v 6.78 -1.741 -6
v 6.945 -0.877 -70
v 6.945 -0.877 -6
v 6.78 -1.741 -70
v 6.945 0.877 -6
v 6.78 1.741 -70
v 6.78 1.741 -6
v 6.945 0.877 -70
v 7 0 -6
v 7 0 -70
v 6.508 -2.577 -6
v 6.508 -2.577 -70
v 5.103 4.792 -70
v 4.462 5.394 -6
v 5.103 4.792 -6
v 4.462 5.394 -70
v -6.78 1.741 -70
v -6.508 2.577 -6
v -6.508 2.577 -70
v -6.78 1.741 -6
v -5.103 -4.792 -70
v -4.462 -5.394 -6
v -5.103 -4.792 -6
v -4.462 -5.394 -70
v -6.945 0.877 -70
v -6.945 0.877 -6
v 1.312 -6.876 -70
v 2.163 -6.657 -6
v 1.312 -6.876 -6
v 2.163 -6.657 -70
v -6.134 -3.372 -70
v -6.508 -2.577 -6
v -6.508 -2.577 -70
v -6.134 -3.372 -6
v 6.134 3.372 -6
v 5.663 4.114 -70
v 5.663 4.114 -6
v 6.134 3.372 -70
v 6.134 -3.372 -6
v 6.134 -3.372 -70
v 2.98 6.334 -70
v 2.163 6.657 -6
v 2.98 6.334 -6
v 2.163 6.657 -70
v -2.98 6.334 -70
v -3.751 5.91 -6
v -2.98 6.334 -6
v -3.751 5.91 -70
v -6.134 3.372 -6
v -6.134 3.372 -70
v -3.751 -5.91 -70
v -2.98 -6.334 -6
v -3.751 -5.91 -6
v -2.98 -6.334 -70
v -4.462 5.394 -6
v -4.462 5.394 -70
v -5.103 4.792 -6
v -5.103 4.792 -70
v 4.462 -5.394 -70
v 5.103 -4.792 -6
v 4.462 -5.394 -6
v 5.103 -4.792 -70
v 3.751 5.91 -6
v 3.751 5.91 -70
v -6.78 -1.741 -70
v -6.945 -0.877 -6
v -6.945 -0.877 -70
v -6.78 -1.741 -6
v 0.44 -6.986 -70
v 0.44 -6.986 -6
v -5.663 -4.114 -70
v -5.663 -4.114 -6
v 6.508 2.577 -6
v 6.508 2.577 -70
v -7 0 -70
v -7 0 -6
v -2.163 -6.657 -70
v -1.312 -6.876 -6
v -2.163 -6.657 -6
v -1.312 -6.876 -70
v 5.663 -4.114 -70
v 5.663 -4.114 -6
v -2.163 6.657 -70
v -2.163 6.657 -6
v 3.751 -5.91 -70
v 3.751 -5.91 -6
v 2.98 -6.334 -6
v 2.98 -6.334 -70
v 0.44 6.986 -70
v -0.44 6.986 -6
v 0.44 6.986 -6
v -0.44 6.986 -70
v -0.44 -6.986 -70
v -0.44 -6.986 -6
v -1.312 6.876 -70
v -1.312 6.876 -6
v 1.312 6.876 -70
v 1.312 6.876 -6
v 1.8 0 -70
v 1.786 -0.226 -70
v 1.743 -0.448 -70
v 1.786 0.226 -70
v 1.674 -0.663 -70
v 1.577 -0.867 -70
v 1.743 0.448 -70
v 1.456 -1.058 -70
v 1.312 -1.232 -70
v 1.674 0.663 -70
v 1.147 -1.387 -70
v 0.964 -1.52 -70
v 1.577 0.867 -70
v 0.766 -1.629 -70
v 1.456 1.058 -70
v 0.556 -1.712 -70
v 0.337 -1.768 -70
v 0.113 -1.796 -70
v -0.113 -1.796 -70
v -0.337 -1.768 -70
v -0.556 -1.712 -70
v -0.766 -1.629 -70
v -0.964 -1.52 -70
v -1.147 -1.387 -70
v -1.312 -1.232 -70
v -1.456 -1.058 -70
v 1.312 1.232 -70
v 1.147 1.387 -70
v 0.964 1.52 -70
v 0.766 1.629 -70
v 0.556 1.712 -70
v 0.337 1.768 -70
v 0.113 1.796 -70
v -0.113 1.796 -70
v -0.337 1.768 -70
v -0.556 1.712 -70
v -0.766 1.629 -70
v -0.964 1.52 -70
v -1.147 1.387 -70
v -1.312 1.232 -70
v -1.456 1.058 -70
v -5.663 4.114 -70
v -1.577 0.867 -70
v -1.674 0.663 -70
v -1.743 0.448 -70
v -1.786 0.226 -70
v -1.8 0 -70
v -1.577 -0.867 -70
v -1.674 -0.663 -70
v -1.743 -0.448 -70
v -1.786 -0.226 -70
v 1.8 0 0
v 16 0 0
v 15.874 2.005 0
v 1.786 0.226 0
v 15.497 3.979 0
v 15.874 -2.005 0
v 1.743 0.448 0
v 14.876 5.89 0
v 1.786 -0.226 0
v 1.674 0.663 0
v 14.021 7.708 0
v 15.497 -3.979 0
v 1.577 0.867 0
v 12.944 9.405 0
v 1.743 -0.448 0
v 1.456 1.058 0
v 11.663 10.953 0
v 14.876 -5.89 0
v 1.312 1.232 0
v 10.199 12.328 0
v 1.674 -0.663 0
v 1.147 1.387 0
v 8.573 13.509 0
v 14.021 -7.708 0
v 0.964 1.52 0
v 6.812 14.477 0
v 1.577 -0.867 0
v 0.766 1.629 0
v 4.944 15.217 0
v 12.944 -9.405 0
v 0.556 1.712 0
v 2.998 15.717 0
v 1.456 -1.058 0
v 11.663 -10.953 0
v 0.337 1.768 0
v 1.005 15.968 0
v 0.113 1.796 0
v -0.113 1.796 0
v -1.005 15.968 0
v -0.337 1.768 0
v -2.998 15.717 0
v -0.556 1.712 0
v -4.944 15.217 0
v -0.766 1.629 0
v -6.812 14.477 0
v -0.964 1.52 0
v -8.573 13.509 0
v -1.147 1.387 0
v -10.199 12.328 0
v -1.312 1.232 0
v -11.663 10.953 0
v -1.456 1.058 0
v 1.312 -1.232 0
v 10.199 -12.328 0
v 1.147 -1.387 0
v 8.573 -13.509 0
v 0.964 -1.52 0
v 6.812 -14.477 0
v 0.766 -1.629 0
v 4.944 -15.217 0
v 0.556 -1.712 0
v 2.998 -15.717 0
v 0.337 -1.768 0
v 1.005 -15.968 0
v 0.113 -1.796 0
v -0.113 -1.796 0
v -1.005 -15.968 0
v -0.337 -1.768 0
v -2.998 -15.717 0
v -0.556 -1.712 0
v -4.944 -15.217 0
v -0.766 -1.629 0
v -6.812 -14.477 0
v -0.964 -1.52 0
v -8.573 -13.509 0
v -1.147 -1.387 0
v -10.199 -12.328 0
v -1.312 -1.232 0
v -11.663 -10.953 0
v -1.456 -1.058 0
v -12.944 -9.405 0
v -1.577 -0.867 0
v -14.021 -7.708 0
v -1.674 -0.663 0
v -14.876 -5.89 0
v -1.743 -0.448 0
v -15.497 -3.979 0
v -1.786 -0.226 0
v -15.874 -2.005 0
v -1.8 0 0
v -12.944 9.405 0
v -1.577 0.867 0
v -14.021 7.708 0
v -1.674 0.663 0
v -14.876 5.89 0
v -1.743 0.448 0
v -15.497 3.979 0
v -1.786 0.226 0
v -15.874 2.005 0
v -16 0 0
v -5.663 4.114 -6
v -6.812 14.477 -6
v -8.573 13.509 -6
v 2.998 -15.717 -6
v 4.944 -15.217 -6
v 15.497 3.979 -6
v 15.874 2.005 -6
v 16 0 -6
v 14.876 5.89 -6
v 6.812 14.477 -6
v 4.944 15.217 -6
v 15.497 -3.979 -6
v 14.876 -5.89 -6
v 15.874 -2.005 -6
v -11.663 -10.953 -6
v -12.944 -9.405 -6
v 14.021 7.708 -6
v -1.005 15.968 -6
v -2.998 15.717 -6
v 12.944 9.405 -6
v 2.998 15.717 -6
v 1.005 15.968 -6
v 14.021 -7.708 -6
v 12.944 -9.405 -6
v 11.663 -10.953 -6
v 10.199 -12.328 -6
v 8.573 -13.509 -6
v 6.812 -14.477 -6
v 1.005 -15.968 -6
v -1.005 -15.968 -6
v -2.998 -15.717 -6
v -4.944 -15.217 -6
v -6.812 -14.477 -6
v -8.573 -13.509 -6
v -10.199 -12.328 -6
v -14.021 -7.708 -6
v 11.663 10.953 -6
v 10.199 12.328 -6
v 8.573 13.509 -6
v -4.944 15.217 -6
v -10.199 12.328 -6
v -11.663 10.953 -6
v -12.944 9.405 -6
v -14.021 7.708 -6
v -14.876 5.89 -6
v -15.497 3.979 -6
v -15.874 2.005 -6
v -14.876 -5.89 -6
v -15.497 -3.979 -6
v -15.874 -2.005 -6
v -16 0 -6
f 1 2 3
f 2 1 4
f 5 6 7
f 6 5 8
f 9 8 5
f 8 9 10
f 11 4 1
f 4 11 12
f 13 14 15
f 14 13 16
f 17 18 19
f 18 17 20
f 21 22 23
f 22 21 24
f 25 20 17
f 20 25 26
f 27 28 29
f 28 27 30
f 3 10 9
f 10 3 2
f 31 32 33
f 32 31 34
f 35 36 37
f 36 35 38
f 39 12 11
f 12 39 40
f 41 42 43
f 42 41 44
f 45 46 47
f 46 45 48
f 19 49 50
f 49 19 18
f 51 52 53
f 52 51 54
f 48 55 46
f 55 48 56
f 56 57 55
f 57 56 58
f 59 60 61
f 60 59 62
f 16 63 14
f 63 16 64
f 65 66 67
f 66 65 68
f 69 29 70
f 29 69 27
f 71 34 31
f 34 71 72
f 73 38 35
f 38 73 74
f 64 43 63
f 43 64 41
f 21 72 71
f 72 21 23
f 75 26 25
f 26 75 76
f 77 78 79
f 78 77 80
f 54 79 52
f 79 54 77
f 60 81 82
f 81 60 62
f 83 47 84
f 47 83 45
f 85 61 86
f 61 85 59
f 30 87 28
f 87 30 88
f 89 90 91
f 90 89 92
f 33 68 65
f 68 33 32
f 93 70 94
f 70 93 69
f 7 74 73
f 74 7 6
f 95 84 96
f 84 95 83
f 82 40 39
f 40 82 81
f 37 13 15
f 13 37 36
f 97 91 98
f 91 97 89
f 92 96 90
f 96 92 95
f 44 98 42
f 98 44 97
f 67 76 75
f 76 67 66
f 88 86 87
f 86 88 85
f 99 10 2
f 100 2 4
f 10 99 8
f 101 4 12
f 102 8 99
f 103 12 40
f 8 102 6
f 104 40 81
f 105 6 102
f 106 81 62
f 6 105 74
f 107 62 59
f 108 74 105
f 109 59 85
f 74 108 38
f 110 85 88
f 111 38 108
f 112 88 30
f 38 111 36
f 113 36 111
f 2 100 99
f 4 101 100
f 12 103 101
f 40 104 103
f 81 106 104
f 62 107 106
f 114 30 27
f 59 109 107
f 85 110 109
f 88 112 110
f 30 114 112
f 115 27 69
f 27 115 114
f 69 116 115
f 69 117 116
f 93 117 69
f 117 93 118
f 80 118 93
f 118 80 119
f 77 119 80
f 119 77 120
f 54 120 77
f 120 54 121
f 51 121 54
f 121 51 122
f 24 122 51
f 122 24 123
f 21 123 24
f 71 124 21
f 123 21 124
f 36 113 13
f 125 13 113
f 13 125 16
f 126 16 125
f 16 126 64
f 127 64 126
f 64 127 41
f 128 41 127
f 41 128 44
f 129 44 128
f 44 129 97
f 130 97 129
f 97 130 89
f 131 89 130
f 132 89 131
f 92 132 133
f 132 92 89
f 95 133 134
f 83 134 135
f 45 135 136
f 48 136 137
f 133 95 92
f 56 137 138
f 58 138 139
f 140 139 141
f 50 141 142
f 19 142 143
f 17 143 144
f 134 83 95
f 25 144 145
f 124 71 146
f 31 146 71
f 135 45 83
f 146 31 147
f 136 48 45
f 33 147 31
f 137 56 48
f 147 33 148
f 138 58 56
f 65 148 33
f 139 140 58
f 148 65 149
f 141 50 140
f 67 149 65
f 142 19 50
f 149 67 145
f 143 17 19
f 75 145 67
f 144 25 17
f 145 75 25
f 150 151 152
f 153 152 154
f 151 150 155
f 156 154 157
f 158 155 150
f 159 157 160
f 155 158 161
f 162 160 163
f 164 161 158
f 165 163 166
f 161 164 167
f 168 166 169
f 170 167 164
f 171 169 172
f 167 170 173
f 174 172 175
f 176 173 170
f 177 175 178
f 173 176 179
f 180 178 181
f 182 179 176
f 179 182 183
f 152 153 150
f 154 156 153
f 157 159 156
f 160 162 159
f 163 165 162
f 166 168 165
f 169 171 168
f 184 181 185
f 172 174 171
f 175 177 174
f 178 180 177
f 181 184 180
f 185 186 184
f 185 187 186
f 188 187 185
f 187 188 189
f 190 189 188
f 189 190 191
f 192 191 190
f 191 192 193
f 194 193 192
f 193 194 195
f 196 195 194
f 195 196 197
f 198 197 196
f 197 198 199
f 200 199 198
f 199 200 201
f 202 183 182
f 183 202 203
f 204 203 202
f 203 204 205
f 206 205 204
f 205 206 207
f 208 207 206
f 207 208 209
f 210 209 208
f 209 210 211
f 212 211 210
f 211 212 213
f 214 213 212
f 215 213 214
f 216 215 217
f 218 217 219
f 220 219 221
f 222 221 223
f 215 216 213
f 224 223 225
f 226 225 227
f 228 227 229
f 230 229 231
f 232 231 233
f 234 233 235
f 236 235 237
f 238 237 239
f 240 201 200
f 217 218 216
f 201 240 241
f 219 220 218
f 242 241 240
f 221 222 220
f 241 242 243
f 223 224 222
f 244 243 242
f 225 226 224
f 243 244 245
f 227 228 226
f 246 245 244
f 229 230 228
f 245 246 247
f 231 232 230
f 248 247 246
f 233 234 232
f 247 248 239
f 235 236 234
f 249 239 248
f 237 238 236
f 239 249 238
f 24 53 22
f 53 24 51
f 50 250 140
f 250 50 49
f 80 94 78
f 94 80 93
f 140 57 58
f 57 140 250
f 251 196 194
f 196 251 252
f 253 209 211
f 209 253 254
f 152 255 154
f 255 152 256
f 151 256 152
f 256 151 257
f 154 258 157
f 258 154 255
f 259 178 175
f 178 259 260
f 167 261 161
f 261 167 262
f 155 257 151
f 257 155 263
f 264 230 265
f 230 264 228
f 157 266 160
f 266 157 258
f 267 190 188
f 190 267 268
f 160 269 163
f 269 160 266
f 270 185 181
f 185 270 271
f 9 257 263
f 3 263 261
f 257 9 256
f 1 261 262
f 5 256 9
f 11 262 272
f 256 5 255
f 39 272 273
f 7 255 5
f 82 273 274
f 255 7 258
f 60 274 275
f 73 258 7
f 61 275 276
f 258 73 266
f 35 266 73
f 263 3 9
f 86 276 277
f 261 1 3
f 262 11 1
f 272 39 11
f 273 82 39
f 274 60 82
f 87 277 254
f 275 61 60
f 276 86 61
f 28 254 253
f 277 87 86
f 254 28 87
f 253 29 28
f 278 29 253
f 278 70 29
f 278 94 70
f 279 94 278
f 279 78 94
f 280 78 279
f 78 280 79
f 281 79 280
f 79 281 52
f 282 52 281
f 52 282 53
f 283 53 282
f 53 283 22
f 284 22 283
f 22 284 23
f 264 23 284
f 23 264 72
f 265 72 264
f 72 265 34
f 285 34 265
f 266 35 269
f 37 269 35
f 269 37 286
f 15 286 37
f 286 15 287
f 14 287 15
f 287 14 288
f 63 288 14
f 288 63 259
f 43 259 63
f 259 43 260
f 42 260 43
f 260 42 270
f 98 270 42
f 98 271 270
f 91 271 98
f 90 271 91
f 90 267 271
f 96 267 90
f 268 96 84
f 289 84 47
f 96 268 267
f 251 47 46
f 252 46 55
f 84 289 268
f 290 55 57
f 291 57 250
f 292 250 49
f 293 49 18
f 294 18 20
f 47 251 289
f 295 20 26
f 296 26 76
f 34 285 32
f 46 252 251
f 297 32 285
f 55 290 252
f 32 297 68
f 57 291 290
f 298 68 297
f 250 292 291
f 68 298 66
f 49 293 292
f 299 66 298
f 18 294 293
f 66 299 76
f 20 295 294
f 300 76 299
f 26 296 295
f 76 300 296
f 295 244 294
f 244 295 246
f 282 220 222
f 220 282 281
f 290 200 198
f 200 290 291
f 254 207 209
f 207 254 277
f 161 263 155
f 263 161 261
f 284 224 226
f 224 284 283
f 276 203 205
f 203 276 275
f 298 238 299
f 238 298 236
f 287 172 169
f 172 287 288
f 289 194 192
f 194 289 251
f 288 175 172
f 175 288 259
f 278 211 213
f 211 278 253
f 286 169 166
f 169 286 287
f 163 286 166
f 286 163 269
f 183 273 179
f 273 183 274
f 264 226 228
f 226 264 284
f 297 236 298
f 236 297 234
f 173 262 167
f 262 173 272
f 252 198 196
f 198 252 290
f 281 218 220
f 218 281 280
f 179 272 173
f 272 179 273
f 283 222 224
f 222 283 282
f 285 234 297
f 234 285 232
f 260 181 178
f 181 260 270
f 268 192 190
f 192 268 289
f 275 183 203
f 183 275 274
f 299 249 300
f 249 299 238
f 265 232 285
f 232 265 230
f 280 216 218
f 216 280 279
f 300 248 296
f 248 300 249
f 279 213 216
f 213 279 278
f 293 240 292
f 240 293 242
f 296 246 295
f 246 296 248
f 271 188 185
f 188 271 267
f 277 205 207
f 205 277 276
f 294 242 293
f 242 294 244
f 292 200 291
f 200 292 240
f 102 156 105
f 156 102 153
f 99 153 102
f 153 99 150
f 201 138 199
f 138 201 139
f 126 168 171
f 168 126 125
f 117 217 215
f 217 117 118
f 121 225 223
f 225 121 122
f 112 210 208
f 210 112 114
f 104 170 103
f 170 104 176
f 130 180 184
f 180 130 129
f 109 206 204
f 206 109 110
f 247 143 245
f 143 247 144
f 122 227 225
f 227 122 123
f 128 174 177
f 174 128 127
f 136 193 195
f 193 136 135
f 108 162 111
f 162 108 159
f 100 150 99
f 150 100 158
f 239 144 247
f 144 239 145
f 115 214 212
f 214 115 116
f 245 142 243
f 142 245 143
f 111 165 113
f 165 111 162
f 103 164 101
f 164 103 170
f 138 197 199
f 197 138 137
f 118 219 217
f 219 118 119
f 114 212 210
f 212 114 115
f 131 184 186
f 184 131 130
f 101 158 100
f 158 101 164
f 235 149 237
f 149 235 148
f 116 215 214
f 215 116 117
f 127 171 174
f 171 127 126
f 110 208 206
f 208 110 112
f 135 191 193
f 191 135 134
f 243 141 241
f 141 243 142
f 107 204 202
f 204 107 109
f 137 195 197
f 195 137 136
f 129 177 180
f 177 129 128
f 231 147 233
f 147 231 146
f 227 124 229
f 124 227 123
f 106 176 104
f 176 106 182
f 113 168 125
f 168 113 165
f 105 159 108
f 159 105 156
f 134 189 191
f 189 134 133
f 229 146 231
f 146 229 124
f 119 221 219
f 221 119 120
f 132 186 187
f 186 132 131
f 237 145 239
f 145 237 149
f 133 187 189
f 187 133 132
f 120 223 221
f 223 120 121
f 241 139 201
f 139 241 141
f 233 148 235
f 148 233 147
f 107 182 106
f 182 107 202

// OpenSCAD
$fn = 50;


difference() {
	union() {
		translate(v = [0, 0, -70.0000000000]) {
			cylinder(h = 70, r = 7.0000000000);
		}
		translate(v = [0, 0, -6.0000000000]) {
			cylinder(h = 6, r = 16.0000000000);
		}
	}
	union() {
		#translate(v = [0, 0, -70]) {
			cylinder(h = 70, r = 1.8000000000);
		}
	}
}
